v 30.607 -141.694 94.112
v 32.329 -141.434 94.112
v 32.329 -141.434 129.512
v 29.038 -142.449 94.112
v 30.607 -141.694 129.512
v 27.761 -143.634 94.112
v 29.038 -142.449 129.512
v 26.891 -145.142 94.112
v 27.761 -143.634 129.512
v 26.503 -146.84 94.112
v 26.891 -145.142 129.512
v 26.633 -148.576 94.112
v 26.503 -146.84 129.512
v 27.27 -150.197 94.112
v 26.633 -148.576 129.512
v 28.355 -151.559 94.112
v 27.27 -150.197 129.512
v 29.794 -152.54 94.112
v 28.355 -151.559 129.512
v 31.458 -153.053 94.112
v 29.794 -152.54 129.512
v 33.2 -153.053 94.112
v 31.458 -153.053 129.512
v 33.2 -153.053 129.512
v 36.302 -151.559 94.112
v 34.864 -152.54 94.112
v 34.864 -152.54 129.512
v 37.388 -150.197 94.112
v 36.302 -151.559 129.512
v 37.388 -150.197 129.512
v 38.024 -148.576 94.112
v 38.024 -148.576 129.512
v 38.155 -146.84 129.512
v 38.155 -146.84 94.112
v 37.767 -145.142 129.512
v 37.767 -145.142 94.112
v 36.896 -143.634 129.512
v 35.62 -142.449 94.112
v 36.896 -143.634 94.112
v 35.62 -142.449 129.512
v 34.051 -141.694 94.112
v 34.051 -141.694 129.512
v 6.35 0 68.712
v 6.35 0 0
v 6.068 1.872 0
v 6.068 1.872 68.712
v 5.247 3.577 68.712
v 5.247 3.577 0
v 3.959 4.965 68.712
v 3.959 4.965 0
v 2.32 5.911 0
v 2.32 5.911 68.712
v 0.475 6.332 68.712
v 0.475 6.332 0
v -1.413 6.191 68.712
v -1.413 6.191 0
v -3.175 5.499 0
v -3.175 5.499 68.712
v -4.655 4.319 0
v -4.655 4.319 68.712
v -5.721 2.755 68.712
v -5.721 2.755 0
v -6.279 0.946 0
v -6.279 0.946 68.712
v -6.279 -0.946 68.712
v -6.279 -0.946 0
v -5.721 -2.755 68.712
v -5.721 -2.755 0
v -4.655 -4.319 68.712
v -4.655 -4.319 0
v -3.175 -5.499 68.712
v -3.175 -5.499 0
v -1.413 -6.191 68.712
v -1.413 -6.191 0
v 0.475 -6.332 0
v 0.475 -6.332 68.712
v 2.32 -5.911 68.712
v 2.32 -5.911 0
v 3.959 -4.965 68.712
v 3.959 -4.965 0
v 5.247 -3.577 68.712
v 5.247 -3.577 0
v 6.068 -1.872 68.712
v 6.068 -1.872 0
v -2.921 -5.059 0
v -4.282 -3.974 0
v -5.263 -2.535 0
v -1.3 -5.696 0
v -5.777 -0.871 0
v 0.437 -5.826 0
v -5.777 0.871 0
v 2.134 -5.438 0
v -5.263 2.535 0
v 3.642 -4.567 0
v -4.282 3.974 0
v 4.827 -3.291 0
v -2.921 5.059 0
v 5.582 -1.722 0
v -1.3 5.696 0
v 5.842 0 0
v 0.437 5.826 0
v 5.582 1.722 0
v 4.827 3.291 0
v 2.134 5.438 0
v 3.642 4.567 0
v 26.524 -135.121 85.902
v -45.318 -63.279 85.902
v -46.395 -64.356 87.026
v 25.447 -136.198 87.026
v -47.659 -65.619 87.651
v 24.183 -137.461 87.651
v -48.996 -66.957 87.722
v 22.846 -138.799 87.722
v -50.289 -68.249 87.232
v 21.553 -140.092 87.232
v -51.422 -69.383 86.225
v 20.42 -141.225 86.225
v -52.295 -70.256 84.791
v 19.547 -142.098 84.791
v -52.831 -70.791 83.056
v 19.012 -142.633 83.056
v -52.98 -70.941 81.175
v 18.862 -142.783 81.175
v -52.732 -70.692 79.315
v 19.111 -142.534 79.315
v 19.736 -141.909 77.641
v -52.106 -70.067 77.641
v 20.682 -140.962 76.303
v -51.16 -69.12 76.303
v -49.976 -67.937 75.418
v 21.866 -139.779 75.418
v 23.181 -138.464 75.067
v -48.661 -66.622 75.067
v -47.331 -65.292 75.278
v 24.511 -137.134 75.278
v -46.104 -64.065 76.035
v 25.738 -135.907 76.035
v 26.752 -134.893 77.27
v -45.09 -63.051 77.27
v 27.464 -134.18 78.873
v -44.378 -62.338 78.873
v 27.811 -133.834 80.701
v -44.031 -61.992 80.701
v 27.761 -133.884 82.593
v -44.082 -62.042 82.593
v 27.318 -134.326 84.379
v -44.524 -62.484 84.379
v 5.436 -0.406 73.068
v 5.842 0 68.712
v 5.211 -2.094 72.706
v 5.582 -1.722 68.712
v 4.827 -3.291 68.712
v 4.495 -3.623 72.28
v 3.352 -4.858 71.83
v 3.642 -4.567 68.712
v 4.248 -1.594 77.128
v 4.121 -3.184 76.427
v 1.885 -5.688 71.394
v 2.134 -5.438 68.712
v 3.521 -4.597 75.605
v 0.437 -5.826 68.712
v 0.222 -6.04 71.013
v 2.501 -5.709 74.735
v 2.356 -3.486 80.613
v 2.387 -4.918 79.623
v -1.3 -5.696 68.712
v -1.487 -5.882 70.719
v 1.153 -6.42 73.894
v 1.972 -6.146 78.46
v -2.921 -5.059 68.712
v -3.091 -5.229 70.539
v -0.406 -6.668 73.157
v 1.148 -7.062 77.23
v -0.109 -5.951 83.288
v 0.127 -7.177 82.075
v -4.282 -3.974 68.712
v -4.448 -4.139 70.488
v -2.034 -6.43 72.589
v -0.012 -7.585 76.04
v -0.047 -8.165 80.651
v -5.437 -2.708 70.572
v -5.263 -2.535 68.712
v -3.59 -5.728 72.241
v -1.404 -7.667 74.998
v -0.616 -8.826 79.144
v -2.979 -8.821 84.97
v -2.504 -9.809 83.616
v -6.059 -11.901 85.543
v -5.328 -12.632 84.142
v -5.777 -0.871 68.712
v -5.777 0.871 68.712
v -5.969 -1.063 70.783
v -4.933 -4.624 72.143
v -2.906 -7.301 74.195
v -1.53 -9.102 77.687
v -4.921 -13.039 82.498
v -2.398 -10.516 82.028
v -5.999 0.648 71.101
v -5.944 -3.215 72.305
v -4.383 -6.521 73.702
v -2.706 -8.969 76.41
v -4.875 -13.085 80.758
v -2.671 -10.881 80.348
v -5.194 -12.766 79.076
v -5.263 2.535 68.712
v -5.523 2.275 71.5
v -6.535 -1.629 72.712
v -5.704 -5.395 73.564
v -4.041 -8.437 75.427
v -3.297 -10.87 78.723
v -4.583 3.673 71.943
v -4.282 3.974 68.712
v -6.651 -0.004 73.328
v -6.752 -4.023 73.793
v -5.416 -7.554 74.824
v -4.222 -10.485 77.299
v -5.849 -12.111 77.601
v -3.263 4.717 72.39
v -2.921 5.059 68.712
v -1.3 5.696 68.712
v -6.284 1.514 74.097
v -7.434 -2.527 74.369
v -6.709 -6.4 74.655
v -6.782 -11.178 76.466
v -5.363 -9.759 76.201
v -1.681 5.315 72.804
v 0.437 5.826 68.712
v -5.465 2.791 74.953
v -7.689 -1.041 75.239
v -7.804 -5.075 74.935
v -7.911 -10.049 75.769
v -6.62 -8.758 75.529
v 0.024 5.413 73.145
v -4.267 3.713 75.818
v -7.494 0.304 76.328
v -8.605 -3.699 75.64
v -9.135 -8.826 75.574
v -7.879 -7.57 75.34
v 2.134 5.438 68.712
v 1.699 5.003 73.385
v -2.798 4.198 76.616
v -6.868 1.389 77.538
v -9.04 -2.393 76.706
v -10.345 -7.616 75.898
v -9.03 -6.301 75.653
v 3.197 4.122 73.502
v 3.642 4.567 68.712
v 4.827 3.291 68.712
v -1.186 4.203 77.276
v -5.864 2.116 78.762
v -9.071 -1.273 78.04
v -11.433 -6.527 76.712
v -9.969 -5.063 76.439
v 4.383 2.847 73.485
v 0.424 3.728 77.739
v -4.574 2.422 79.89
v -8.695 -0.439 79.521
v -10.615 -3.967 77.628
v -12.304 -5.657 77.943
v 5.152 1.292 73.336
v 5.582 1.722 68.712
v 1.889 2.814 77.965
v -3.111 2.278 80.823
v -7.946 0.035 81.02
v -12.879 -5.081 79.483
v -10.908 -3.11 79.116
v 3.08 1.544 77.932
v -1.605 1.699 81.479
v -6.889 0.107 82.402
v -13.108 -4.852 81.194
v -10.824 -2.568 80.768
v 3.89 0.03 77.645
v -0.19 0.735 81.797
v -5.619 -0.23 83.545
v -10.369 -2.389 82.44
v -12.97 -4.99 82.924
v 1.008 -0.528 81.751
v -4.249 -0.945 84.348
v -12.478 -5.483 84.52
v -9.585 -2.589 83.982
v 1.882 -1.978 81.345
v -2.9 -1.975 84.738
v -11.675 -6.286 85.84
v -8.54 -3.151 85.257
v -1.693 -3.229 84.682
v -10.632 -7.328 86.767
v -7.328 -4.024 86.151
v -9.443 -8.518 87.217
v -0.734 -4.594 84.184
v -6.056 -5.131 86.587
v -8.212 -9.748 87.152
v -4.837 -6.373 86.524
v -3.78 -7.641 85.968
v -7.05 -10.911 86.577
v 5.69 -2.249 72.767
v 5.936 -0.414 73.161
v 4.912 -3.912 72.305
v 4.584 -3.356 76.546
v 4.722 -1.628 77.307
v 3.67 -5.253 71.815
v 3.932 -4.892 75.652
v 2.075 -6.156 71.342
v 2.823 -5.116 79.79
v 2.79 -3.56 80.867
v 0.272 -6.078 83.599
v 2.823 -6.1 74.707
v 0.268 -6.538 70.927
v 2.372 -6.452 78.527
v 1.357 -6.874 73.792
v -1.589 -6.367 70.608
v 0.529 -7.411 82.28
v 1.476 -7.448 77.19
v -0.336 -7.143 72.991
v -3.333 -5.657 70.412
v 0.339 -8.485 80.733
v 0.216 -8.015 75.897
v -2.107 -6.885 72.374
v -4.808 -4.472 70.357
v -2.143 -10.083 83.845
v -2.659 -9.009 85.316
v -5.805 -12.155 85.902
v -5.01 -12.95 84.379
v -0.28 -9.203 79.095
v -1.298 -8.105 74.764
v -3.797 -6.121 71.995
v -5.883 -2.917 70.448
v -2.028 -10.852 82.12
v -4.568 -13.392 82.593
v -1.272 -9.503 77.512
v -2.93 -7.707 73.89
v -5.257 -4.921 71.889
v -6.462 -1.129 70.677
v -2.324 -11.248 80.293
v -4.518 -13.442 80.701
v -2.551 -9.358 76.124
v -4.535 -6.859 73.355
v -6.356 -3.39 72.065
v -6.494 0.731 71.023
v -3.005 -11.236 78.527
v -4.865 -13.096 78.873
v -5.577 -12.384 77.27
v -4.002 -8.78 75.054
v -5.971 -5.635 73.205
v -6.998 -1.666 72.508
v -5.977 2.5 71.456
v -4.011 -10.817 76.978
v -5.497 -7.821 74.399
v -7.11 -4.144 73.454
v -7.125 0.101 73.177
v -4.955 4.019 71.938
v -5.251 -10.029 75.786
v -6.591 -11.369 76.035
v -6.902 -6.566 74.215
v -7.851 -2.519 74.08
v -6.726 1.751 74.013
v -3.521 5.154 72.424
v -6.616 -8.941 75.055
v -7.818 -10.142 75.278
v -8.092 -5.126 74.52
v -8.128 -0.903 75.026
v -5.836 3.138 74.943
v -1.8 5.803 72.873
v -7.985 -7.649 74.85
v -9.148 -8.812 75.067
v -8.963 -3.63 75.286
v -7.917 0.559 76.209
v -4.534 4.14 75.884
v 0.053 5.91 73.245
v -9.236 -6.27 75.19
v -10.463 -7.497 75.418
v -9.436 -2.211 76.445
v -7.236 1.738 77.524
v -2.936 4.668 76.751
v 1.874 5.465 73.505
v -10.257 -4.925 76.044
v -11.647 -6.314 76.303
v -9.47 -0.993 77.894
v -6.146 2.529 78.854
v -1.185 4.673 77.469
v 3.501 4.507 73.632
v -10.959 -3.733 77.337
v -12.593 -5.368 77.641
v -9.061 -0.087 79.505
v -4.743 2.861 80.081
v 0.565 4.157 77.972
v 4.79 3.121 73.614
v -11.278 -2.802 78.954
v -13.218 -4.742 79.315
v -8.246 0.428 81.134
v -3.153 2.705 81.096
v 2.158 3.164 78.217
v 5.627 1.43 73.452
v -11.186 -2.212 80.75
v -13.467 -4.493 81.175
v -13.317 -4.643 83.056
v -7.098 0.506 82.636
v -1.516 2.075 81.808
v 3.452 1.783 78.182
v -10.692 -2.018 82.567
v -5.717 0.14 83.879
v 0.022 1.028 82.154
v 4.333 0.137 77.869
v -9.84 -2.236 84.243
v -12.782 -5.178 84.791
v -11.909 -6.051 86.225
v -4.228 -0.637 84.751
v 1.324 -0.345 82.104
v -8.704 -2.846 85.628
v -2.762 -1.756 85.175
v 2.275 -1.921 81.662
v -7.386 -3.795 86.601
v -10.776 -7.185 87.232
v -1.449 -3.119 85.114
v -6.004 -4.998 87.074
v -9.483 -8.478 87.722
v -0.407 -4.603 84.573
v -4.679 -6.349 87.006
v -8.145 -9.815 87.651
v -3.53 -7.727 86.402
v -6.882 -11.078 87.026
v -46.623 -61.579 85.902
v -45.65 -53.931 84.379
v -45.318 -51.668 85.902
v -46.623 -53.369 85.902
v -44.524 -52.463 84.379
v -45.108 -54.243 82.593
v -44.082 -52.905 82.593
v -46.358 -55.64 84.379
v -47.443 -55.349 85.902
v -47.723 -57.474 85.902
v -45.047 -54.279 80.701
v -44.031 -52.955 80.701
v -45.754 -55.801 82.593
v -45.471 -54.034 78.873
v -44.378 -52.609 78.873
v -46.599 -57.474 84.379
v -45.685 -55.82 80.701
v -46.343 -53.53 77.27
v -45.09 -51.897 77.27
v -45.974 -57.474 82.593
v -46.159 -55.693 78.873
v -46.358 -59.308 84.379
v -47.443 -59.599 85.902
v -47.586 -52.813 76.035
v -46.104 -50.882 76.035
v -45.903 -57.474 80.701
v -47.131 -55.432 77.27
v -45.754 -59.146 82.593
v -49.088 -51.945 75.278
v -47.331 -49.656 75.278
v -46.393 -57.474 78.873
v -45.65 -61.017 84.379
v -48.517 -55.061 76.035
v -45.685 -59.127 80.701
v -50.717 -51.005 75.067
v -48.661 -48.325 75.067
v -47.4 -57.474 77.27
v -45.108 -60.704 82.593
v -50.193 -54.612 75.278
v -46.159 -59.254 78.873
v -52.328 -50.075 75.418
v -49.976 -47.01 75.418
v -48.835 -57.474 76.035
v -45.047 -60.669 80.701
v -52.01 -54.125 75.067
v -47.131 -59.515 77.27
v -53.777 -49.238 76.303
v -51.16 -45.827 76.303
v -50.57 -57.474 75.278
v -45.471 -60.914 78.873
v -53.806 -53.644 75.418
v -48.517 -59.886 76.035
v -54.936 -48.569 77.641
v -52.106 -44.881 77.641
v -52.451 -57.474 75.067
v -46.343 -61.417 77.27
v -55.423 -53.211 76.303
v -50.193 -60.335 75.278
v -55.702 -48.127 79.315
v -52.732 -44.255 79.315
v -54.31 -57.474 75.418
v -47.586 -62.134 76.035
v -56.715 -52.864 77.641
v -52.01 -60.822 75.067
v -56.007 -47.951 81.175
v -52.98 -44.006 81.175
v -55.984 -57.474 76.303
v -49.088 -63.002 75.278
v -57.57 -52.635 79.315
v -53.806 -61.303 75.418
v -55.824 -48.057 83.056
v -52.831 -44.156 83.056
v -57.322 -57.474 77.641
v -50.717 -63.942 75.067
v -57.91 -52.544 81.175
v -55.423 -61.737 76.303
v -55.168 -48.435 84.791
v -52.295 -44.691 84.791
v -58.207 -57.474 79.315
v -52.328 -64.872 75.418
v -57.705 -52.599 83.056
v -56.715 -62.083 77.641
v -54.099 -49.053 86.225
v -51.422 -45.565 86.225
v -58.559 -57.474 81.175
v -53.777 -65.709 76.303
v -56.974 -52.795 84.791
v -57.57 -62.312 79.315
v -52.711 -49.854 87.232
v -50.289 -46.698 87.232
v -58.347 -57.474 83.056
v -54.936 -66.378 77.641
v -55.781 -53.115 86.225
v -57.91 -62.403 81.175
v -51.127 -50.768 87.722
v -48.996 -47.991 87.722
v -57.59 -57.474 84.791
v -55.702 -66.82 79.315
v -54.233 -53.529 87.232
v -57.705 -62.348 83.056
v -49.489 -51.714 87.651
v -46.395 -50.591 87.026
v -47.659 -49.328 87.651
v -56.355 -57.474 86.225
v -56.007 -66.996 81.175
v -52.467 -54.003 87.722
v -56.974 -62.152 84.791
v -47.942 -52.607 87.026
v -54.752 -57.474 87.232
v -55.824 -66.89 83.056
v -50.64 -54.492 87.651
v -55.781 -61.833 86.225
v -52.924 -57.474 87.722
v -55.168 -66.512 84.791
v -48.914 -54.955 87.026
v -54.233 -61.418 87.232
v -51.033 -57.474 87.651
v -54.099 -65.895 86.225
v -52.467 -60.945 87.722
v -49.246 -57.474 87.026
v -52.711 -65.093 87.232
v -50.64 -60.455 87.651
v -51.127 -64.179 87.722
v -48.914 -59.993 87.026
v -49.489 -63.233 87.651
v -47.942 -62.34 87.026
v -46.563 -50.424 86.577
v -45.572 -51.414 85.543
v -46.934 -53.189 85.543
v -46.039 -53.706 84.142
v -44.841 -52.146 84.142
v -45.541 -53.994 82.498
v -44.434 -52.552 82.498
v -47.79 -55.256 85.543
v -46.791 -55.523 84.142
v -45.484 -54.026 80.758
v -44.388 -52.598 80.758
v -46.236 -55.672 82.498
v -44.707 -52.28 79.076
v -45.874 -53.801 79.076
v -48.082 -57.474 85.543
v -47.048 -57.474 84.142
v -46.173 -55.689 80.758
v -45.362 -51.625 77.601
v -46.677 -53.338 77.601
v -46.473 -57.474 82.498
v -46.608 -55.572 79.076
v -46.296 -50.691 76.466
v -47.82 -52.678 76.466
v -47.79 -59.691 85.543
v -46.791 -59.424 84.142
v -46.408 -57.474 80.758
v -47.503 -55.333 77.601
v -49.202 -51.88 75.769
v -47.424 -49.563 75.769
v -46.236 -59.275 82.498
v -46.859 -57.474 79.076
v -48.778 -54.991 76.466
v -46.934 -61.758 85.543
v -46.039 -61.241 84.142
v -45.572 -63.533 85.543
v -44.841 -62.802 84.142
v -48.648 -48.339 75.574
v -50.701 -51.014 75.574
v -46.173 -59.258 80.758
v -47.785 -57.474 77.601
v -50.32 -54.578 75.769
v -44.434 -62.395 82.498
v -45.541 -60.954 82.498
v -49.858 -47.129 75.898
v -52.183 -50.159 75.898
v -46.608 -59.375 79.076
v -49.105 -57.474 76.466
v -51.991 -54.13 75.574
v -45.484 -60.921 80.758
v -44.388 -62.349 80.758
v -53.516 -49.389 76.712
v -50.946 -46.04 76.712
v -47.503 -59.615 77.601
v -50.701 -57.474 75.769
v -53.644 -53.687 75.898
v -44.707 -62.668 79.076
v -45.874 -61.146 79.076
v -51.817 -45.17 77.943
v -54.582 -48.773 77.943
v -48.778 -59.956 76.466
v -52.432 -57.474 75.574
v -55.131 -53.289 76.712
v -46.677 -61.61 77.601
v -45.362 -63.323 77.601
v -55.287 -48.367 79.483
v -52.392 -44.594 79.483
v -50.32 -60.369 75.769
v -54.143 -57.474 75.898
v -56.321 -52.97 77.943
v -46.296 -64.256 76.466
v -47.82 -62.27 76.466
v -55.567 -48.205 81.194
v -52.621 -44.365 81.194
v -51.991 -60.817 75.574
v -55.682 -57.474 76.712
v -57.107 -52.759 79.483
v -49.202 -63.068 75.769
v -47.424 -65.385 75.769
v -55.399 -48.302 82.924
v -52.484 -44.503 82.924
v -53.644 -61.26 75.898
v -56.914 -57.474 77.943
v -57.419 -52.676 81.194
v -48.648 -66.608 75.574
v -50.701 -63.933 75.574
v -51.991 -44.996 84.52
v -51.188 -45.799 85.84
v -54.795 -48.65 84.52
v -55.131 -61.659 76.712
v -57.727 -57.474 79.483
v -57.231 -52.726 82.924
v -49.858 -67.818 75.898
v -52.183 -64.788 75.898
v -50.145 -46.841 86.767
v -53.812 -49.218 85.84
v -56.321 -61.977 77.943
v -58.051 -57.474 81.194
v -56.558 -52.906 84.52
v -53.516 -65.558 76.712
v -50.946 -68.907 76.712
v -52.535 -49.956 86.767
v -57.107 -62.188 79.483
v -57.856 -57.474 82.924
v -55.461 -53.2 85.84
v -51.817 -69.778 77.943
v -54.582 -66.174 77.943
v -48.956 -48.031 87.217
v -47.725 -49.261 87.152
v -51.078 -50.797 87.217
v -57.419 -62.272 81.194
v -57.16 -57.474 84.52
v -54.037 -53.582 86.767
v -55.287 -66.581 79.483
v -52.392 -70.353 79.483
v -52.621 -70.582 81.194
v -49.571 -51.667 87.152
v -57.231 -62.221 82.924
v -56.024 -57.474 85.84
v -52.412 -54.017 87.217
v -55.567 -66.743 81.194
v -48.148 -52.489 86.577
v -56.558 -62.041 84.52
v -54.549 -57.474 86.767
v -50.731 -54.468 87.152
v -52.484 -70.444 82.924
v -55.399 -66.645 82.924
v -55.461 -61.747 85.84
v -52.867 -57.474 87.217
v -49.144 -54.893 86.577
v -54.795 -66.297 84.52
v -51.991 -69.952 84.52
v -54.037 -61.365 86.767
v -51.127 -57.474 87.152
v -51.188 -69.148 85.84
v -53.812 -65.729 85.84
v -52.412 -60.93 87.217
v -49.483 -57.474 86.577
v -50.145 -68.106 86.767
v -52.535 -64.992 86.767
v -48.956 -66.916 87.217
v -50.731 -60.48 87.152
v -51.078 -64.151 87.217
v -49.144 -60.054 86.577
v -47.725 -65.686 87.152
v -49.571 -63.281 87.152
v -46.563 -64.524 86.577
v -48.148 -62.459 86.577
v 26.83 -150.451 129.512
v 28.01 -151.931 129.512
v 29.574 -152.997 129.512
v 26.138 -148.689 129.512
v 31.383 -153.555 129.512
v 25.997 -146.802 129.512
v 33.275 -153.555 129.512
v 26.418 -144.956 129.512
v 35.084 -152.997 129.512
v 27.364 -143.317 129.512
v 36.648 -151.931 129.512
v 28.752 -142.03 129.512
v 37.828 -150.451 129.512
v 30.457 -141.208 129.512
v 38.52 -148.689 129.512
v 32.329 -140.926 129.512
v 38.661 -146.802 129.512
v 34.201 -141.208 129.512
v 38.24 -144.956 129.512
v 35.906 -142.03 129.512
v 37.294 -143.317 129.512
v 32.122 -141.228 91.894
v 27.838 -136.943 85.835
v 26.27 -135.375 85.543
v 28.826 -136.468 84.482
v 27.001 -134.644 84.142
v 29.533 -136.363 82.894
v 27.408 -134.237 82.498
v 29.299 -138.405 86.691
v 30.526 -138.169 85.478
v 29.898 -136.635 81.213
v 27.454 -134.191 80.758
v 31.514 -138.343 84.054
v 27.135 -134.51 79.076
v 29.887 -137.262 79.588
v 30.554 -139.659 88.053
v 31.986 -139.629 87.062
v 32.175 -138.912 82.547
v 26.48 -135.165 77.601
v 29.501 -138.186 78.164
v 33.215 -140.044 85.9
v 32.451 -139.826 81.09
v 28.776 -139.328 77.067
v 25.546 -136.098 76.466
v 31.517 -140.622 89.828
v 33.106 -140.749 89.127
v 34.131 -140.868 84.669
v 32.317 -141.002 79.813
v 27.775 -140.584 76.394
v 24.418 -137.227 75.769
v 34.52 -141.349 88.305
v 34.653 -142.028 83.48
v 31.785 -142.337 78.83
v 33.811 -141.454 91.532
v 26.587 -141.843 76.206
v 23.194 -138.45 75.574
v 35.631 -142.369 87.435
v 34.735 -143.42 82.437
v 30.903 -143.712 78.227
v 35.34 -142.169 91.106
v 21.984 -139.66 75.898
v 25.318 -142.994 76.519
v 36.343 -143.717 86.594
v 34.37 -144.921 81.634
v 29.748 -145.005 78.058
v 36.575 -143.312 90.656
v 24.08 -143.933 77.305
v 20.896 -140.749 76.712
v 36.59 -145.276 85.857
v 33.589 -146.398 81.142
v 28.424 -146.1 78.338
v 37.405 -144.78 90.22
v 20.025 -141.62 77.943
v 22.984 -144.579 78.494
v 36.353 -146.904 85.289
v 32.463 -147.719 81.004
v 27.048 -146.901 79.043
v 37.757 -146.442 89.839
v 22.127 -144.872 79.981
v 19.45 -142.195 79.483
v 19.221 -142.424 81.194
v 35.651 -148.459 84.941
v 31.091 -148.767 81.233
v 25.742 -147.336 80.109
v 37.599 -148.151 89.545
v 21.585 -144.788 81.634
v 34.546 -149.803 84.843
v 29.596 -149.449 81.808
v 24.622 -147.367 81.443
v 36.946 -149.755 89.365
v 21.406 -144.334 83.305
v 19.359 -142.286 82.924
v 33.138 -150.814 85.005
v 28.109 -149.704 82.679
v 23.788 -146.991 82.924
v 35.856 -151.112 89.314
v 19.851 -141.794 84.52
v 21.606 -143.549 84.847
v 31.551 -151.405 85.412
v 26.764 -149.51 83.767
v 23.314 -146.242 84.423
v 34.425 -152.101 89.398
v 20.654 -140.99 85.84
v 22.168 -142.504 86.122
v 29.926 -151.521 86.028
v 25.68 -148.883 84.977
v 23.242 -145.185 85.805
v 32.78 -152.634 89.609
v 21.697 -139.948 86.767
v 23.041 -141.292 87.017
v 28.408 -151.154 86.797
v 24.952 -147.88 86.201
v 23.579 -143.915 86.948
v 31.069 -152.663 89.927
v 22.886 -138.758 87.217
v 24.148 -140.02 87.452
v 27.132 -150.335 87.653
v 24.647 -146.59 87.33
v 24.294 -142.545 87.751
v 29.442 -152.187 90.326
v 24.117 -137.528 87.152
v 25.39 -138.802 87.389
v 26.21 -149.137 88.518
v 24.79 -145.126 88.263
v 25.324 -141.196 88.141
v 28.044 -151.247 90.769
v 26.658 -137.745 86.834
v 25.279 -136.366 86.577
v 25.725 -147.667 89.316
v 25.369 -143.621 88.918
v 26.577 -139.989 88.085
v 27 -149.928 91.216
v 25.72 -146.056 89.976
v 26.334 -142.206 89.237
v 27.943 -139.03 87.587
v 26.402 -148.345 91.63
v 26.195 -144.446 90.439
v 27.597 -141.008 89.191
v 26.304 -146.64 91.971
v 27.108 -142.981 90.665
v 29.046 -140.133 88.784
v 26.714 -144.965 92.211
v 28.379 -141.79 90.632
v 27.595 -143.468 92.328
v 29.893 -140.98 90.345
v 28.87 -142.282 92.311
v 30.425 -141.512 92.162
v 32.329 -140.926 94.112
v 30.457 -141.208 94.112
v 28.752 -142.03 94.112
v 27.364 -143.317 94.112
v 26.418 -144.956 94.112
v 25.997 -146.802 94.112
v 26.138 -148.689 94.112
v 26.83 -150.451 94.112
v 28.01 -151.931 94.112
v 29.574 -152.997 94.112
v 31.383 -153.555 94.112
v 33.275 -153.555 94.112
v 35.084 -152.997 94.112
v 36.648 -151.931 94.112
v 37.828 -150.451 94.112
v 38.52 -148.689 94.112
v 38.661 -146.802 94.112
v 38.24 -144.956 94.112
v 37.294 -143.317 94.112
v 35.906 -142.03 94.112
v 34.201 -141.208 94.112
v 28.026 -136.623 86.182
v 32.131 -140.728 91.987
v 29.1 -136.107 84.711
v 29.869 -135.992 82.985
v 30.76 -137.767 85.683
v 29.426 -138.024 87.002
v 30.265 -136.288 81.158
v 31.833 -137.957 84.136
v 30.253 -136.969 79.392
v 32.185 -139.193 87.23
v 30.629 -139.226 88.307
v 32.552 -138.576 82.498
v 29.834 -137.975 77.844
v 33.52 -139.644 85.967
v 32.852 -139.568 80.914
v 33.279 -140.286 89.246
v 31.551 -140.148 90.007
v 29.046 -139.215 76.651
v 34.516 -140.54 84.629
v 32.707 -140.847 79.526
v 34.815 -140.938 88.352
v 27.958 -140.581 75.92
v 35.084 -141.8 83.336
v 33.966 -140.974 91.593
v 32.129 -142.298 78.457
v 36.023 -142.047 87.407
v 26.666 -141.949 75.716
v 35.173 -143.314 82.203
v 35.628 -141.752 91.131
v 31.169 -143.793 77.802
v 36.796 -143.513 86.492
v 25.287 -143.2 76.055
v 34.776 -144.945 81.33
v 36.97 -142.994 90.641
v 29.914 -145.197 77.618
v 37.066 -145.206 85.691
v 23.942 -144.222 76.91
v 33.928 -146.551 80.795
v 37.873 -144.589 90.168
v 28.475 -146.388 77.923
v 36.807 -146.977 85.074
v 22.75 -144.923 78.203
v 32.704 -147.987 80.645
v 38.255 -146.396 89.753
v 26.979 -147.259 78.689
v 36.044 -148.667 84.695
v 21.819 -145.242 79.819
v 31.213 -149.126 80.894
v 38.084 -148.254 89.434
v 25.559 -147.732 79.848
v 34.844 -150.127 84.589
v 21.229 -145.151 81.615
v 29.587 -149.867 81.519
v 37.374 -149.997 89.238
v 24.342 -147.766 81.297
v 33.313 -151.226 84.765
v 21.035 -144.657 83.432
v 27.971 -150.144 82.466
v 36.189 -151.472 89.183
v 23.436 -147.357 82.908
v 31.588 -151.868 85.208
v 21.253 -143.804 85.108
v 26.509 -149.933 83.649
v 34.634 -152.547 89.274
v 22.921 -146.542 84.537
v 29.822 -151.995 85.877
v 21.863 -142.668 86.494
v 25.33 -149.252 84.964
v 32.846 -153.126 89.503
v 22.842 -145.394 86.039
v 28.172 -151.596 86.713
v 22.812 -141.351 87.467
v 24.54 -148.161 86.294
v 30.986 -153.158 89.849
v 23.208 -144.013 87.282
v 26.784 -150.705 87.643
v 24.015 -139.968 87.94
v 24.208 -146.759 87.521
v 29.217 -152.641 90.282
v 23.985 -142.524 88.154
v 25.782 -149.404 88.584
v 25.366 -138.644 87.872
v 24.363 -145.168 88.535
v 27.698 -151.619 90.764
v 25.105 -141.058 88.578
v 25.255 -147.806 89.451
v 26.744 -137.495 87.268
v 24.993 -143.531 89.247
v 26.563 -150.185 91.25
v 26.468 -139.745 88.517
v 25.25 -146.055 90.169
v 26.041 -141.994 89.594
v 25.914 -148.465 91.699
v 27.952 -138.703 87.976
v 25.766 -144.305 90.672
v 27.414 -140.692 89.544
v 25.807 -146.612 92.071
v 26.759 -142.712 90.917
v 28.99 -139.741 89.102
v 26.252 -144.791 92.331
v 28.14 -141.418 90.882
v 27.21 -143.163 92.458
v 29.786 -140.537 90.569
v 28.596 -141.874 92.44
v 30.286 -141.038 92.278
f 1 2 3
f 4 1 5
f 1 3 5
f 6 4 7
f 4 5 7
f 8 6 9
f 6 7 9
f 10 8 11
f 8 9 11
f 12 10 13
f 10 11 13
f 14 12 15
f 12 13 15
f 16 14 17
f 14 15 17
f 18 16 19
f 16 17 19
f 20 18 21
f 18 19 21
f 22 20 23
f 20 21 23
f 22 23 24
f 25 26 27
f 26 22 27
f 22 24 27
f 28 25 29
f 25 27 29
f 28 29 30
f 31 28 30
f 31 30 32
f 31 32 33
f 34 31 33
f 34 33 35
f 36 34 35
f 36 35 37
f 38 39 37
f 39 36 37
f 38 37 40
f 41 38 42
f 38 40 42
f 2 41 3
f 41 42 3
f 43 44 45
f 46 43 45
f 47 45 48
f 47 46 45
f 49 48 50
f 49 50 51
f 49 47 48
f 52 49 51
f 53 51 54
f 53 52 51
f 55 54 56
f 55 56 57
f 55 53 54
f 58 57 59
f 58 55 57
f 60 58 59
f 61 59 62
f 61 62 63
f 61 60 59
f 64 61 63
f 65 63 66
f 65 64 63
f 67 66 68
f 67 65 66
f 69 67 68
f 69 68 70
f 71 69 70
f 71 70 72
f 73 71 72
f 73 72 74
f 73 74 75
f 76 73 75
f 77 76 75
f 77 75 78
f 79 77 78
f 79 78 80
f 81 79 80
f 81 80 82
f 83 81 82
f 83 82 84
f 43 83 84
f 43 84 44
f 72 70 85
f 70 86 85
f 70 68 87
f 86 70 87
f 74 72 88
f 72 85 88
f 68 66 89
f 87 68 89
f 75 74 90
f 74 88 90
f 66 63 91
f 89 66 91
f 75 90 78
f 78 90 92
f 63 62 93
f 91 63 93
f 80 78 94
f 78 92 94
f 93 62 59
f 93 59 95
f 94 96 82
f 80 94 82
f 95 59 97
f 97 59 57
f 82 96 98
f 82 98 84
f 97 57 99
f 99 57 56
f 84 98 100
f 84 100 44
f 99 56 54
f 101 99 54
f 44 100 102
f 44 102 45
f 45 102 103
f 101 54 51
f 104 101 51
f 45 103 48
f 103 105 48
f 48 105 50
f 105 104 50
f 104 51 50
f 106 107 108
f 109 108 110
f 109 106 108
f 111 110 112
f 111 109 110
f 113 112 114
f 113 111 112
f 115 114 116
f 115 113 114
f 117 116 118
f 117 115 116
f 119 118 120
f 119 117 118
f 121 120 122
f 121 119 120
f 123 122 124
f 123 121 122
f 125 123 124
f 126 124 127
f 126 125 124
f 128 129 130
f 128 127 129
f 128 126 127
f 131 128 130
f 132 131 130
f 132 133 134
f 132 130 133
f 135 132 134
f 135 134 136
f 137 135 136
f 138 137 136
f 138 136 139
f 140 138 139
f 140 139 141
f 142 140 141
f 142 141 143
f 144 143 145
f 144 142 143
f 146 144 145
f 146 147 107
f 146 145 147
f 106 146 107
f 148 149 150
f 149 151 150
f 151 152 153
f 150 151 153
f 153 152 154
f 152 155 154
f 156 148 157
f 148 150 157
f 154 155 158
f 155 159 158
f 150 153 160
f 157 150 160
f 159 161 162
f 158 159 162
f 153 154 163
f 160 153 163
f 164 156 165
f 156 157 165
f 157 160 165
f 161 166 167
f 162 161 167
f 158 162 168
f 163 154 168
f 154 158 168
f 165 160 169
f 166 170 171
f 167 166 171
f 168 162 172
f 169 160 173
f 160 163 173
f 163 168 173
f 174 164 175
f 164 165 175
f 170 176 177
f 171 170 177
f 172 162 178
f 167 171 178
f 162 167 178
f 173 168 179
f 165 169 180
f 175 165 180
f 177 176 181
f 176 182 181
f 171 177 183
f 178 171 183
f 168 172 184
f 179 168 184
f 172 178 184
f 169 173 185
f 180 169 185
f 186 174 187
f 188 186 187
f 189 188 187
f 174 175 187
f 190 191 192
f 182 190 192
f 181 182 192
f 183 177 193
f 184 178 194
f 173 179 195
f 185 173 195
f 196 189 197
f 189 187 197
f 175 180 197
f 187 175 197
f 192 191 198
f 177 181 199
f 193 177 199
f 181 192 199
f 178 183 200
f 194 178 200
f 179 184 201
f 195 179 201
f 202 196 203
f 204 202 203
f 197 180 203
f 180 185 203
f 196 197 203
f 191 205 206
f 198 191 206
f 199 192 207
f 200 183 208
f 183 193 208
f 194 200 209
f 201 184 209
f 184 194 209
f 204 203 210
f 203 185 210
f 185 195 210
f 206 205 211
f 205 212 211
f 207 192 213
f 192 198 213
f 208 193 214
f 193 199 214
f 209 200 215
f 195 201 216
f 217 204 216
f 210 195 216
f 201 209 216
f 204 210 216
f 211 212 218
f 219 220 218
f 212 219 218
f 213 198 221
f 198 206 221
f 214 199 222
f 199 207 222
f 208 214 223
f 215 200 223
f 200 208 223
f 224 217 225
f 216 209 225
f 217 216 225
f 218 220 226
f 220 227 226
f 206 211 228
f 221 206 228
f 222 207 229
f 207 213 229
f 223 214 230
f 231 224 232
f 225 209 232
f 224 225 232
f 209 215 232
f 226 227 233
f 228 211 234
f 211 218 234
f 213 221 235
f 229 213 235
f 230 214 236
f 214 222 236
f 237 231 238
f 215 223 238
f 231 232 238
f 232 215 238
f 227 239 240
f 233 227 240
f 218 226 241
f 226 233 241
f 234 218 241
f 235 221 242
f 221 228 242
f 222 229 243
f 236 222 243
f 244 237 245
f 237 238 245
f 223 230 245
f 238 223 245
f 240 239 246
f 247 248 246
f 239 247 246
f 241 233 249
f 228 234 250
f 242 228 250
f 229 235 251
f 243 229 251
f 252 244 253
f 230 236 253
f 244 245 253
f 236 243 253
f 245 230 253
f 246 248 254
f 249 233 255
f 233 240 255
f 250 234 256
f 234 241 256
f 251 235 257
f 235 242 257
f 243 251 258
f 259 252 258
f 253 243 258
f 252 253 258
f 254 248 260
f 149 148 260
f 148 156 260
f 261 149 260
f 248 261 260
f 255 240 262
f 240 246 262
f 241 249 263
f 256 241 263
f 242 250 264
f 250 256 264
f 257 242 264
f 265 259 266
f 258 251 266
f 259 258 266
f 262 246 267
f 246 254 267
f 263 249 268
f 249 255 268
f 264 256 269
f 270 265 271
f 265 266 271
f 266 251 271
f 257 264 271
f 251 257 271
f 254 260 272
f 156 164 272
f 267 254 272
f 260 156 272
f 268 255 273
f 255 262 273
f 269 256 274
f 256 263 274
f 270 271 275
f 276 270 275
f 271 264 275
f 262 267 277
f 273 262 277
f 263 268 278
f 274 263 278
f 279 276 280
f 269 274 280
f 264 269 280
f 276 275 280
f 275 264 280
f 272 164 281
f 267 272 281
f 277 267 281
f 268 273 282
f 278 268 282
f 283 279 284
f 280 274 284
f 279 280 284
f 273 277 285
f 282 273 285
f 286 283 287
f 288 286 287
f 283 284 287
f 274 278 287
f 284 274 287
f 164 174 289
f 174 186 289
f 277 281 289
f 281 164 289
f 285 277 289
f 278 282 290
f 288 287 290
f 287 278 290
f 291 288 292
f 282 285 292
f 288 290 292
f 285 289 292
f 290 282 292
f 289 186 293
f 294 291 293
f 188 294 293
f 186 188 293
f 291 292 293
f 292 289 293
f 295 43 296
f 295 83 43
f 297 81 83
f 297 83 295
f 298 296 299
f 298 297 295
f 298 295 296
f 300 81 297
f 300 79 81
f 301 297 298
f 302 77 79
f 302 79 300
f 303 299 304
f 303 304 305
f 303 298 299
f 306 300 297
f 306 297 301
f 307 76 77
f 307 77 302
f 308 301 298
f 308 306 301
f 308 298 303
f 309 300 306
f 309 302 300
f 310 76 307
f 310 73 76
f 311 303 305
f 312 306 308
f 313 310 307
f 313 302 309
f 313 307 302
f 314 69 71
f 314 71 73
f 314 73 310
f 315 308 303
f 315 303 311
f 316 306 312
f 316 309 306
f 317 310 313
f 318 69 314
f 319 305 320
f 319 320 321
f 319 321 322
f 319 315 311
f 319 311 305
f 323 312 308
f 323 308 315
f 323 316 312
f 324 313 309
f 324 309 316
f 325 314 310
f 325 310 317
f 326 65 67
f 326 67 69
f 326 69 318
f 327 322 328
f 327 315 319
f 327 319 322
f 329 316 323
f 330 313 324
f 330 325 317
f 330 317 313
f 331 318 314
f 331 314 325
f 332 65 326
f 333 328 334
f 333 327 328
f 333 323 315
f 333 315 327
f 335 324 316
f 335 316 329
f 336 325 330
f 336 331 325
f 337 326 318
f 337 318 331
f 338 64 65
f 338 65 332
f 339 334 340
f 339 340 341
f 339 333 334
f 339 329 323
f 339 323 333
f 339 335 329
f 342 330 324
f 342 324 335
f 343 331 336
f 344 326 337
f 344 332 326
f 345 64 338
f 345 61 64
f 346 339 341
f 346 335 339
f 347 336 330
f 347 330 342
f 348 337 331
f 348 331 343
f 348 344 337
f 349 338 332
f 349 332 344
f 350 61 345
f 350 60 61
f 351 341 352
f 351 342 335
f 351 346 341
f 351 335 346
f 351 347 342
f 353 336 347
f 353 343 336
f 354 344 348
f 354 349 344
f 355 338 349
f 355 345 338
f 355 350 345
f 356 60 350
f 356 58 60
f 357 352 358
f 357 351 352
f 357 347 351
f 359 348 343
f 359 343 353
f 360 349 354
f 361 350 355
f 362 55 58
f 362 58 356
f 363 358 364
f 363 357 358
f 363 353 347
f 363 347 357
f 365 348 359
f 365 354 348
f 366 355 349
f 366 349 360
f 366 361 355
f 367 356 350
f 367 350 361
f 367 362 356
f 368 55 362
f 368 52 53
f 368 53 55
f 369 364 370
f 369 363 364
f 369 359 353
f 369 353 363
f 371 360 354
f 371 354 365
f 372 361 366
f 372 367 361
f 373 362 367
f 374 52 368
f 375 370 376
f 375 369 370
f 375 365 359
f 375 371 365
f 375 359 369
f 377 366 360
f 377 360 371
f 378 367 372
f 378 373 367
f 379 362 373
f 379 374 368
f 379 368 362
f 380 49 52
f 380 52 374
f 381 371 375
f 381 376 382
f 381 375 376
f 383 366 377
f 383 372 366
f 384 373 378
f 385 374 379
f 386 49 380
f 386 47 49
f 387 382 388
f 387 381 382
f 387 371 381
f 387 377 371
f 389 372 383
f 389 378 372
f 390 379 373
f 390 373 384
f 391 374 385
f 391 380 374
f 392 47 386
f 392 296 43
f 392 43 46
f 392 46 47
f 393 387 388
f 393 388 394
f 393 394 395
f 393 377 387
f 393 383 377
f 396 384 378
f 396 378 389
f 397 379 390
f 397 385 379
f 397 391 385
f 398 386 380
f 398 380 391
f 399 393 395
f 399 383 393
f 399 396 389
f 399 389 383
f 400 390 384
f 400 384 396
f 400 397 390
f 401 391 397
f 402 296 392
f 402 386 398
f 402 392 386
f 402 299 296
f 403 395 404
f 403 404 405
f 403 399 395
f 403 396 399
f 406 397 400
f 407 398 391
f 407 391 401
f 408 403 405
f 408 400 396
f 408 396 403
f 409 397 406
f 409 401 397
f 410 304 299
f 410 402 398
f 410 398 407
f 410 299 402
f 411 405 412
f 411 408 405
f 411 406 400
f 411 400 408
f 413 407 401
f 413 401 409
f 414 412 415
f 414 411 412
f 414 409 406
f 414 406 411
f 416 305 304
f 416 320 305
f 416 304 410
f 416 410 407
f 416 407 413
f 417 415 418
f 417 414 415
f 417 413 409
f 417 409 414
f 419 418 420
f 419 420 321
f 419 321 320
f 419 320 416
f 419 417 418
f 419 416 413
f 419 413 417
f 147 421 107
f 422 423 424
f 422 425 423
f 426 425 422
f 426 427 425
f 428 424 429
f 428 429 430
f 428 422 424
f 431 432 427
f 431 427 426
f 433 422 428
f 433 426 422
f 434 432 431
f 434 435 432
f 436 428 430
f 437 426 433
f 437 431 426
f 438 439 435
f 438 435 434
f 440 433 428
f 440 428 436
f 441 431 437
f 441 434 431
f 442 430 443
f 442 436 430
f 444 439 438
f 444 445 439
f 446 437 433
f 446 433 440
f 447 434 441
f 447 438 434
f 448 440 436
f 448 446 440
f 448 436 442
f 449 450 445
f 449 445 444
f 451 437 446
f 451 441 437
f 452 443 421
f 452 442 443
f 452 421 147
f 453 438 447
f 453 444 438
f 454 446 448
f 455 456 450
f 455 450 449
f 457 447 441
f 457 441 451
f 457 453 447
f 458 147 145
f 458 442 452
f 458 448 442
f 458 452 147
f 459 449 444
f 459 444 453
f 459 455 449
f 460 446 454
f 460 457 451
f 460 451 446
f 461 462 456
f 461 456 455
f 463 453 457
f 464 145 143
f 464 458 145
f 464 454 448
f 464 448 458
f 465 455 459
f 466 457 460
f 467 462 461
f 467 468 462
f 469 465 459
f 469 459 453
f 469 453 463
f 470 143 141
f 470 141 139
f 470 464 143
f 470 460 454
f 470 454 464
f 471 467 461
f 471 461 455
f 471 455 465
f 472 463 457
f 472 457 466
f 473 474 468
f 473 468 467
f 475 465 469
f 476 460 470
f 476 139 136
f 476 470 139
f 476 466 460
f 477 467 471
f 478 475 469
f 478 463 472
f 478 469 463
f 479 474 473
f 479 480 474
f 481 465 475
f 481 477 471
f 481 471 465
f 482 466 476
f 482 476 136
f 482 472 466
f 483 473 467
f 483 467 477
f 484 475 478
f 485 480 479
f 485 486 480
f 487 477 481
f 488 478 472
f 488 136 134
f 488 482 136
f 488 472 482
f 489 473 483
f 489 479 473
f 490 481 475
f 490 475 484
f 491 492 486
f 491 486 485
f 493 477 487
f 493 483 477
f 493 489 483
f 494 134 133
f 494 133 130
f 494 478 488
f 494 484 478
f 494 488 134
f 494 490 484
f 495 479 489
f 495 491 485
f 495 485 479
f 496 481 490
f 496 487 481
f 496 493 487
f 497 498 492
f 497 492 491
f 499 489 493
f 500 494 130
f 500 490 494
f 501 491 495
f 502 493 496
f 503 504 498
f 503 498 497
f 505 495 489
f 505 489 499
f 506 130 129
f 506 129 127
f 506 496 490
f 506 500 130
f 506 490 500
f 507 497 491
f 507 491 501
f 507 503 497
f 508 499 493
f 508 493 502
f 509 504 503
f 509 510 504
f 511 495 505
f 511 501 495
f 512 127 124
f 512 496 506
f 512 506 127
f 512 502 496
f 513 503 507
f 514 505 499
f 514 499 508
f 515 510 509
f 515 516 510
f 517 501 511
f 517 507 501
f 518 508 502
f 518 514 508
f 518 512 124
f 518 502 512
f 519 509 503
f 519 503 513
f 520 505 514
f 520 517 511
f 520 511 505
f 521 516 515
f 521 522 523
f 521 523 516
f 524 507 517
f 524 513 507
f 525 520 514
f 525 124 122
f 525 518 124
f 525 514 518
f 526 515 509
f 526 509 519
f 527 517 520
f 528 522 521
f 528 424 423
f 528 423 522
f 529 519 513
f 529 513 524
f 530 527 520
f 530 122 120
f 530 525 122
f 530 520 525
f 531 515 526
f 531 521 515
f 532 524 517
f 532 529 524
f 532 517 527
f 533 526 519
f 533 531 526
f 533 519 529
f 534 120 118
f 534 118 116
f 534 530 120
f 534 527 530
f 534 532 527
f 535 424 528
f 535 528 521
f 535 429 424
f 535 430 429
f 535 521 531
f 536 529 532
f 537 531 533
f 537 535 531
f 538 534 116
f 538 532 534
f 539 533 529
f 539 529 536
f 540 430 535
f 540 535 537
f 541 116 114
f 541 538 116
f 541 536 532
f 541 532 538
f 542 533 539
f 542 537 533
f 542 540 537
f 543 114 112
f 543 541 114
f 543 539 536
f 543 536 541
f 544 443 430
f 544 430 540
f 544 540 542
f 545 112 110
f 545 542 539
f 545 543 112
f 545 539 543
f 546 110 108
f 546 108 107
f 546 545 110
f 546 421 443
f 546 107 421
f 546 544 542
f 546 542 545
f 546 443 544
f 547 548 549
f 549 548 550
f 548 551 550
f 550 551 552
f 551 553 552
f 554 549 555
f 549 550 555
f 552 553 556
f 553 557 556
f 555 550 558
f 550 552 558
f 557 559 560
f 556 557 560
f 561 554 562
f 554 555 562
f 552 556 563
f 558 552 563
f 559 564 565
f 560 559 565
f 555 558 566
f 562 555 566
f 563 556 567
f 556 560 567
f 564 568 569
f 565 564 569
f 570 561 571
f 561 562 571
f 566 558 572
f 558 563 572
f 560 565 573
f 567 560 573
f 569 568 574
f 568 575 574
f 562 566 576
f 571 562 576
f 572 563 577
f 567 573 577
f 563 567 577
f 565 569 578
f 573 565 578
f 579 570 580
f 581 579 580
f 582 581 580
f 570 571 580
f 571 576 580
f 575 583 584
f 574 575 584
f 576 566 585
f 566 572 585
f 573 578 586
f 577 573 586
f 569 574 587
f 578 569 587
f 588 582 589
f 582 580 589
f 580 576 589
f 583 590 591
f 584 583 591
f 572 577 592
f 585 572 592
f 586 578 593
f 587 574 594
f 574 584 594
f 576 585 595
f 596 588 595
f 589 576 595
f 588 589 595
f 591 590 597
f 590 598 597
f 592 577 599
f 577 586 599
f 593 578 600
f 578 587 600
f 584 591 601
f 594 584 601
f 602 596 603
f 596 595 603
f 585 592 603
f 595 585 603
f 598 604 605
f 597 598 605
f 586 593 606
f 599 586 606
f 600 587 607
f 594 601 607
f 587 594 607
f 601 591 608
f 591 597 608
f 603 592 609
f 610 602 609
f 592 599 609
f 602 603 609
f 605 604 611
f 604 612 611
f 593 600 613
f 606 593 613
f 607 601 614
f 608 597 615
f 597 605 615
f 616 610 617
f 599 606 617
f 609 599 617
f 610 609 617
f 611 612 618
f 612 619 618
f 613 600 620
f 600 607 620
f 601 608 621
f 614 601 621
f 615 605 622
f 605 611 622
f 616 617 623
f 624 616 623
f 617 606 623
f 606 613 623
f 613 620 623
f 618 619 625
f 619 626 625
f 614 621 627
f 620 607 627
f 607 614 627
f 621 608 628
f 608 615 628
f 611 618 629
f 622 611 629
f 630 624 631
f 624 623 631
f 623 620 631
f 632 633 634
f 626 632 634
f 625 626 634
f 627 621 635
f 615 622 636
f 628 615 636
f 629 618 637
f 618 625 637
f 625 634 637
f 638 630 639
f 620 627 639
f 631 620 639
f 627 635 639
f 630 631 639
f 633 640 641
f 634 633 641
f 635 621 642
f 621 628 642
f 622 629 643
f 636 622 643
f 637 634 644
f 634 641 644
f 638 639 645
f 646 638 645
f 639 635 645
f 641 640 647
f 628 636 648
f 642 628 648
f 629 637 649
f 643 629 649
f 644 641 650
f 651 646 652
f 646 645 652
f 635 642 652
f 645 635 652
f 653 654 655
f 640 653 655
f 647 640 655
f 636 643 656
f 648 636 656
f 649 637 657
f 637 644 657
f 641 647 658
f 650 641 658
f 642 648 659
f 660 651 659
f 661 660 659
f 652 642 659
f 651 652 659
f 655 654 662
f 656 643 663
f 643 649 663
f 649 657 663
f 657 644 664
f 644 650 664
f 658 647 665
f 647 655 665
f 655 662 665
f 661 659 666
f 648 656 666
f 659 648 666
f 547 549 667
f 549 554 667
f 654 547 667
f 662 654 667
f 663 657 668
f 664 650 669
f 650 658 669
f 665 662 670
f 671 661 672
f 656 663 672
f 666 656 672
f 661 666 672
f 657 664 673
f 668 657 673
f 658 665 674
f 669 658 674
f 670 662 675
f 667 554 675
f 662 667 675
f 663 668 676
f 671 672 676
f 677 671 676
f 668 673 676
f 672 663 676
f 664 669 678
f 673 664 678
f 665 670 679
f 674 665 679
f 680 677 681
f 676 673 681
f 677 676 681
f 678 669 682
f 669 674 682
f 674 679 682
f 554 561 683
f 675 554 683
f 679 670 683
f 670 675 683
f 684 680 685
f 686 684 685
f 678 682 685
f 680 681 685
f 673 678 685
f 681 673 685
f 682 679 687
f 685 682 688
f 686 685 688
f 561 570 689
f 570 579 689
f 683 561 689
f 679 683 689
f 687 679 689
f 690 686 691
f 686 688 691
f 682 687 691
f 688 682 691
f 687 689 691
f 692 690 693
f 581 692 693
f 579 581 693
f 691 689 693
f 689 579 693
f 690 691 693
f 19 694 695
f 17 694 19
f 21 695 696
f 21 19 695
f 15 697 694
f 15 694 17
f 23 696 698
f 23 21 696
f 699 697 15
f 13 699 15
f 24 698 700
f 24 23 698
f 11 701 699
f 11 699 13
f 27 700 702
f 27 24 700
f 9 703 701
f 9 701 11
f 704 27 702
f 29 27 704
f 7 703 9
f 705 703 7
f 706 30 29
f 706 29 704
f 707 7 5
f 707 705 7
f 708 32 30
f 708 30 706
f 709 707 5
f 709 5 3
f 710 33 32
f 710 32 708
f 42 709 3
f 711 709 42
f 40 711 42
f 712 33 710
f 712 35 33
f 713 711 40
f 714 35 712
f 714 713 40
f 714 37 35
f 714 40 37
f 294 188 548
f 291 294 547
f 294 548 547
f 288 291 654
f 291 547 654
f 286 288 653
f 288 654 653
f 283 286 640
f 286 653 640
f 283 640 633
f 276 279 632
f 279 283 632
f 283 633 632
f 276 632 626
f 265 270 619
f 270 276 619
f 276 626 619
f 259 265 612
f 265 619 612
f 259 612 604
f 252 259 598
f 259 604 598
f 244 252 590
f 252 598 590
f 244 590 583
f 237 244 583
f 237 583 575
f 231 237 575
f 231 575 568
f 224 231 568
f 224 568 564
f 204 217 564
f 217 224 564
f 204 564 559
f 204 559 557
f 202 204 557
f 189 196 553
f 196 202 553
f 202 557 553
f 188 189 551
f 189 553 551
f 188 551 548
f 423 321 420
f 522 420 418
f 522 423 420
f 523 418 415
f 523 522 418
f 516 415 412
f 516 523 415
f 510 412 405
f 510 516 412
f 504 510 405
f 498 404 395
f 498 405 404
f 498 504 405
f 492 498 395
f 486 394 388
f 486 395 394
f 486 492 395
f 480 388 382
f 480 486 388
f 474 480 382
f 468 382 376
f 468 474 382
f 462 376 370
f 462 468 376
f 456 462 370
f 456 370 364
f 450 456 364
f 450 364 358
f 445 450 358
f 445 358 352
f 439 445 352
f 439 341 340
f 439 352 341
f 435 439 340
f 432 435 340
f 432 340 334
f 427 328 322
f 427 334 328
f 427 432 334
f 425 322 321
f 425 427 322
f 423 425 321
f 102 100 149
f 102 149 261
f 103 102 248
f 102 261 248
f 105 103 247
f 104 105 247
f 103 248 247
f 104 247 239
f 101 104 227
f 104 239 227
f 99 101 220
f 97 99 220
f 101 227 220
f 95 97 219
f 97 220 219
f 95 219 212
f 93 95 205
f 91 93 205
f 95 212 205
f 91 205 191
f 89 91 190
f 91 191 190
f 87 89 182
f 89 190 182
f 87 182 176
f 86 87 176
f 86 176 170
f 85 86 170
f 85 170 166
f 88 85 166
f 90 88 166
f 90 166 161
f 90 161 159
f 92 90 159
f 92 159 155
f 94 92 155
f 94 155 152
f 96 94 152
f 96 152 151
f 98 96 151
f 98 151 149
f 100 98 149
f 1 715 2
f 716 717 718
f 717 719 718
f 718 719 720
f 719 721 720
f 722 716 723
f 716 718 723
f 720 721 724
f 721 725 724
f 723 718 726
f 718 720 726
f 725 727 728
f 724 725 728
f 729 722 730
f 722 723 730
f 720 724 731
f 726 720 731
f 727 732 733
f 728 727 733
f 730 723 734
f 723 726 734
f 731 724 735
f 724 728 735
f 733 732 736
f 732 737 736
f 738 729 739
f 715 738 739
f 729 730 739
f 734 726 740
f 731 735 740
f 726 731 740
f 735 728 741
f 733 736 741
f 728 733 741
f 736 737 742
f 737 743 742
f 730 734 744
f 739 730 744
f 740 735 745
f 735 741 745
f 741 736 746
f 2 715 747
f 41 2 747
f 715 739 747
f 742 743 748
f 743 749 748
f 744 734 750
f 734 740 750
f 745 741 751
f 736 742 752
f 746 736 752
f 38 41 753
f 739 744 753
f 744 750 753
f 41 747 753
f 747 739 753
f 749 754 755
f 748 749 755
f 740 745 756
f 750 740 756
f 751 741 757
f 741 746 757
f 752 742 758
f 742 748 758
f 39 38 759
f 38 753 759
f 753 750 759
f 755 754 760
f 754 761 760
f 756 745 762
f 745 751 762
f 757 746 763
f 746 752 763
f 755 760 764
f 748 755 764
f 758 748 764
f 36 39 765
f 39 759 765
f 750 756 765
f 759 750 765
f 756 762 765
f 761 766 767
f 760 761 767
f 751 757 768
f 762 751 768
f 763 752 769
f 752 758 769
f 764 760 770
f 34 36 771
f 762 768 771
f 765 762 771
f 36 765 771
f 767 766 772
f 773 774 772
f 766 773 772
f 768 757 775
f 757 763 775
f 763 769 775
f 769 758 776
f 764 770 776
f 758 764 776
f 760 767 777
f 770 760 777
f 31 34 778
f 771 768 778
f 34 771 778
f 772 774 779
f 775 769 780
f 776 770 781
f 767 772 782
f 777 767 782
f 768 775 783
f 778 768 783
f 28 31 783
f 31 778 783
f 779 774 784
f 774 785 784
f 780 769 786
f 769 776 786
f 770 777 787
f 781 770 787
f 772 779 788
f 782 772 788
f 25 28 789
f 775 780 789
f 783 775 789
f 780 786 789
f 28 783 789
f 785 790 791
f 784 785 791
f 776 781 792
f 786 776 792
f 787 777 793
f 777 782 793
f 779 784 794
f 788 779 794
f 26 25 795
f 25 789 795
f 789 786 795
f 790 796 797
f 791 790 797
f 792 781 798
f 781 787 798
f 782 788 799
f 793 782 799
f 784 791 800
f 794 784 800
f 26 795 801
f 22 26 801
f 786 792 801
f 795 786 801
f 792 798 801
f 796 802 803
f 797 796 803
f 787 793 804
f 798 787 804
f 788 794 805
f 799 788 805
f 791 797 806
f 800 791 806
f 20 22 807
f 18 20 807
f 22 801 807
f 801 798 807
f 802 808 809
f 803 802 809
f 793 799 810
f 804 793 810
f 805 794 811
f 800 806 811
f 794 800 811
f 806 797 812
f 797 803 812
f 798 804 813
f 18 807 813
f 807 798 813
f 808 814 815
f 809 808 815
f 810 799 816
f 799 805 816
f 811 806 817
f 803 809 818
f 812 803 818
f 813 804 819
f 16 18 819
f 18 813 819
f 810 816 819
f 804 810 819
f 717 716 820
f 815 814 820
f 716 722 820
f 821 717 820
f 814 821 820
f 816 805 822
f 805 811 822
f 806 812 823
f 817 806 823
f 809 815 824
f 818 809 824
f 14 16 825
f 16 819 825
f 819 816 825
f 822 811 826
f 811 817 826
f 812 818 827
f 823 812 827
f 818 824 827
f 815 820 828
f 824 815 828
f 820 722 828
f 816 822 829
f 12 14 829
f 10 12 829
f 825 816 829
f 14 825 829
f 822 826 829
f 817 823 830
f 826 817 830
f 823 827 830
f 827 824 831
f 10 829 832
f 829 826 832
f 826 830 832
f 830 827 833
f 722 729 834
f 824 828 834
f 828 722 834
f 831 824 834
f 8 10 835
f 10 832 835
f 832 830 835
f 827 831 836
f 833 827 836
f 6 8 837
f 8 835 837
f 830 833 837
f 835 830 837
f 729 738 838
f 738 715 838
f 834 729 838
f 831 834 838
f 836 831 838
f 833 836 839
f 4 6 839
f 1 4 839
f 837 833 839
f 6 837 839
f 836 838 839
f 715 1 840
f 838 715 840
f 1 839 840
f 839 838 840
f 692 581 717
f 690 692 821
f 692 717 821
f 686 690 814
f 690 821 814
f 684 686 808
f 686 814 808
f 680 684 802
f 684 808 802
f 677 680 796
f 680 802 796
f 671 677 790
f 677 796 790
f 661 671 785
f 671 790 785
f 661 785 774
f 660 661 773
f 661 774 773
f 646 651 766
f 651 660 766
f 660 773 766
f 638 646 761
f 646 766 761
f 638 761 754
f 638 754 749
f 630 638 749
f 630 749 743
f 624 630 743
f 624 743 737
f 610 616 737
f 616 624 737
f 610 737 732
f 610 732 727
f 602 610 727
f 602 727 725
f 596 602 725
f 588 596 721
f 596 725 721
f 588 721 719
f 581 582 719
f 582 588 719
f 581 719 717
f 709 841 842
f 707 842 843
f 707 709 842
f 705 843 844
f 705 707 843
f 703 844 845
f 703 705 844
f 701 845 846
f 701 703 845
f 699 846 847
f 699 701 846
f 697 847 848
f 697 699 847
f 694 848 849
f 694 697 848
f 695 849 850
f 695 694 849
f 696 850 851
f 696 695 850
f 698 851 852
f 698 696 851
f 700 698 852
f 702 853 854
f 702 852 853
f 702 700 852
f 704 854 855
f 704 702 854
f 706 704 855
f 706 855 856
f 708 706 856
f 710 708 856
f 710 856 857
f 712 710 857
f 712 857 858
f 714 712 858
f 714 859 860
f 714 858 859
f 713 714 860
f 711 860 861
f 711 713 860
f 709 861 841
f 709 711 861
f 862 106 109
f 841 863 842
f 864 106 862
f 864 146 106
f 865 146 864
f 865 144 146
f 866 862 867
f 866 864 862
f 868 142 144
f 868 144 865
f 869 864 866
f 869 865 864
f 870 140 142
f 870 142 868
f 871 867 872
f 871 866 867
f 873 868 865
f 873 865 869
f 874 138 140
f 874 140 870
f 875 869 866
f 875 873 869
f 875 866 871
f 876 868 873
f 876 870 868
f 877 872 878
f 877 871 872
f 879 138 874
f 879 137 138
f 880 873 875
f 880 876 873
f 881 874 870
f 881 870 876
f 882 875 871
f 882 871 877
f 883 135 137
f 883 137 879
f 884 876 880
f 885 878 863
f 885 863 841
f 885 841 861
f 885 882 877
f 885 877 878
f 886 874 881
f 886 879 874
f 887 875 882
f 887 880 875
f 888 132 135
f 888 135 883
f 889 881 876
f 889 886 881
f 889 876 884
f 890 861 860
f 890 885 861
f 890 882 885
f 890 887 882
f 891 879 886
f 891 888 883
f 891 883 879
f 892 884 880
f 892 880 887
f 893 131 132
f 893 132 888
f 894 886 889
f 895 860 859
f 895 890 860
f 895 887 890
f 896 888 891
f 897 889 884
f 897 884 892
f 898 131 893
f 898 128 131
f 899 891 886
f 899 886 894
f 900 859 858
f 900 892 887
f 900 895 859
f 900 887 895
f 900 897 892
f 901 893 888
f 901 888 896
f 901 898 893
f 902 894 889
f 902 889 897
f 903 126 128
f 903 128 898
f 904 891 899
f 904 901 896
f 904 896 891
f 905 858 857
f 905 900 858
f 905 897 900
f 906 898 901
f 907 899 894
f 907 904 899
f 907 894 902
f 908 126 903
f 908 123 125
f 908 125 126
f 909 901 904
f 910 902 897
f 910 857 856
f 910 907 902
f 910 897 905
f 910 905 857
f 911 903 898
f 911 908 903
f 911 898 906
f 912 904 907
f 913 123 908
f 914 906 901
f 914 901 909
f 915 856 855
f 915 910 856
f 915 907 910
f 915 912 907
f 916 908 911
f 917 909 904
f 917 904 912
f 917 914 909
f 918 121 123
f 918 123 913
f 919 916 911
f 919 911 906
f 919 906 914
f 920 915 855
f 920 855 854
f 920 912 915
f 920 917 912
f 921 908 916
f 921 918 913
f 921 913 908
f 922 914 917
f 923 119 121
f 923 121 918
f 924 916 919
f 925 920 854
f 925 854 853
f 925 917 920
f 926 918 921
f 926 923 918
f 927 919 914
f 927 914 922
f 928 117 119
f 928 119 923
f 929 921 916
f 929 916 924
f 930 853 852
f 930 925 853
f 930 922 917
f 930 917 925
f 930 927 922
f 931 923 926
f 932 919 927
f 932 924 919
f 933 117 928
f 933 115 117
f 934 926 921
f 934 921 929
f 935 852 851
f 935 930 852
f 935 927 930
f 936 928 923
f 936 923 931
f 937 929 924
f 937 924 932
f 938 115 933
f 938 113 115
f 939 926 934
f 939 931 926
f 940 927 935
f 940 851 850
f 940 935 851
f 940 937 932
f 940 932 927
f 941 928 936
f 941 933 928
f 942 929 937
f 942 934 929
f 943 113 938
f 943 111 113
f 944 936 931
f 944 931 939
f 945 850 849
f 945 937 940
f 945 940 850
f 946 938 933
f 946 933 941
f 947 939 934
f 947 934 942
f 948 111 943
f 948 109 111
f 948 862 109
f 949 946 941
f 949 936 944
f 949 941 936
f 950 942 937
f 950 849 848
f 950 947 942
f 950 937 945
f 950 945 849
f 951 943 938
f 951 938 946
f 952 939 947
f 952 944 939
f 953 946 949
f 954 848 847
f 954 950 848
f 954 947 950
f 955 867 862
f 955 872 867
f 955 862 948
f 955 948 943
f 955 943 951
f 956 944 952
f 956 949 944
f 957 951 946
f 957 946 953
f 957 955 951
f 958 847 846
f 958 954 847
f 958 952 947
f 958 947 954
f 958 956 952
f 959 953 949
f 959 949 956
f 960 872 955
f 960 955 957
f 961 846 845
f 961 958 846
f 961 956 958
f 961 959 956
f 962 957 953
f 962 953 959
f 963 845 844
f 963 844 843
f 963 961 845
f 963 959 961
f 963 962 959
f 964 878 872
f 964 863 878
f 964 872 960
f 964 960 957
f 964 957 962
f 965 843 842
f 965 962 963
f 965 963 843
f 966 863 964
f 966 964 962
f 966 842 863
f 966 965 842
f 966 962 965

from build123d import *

# Parameters (mm, degrees)
PIPESKETCH_R   = 6.35
PIPESKETCH_R_2 = 5.842


with BuildPart() as part:
    # ThinSweep: sweep along a curve in space
    with BuildLine() as thinsweep_path:
        Line((0, 0, 0), (0, 0, 68.7121))
        ThreePointArc((0, 0, 68.7121), (-2.630256121, -2.630256121, 77.692356121), (-8.980256121, -8.980256121, 81.4121))
        Line((-8.980256121, -8.980256121, 81.4121), (-48.493383054, -48.493383054, 81.4121))
        ThreePointArc((-48.493383054, -48.493383054, 81.4121), (-52.213126933, -57.473639175, 81.4121), (-48.493383054, -66.453895296, 81.4121))
        Line((-48.493383054, -66.453895296, 81.4121), (23.348665915, -138.295944264, 81.4121))
        ThreePointArc((23.348665915, -138.295944264, 81.4121), (29.698665915, -144.645944264, 85.131843879), (32.328922036, -147.276200386, 94.1121))
        Line((32.328922036, -147.276200386, 129.5121), (32.328922036, -147.276200386, 94.1121))
    # PipeSketch → ThinSweep (sweep)
    with BuildSketch(Plane.XY):
        Circle(PIPESKETCH_R)
        Circle(PIPESKETCH_R_2, mode=Mode.SUBTRACT)
    sweep(path=thinsweep_path.line)


solid = part.part
